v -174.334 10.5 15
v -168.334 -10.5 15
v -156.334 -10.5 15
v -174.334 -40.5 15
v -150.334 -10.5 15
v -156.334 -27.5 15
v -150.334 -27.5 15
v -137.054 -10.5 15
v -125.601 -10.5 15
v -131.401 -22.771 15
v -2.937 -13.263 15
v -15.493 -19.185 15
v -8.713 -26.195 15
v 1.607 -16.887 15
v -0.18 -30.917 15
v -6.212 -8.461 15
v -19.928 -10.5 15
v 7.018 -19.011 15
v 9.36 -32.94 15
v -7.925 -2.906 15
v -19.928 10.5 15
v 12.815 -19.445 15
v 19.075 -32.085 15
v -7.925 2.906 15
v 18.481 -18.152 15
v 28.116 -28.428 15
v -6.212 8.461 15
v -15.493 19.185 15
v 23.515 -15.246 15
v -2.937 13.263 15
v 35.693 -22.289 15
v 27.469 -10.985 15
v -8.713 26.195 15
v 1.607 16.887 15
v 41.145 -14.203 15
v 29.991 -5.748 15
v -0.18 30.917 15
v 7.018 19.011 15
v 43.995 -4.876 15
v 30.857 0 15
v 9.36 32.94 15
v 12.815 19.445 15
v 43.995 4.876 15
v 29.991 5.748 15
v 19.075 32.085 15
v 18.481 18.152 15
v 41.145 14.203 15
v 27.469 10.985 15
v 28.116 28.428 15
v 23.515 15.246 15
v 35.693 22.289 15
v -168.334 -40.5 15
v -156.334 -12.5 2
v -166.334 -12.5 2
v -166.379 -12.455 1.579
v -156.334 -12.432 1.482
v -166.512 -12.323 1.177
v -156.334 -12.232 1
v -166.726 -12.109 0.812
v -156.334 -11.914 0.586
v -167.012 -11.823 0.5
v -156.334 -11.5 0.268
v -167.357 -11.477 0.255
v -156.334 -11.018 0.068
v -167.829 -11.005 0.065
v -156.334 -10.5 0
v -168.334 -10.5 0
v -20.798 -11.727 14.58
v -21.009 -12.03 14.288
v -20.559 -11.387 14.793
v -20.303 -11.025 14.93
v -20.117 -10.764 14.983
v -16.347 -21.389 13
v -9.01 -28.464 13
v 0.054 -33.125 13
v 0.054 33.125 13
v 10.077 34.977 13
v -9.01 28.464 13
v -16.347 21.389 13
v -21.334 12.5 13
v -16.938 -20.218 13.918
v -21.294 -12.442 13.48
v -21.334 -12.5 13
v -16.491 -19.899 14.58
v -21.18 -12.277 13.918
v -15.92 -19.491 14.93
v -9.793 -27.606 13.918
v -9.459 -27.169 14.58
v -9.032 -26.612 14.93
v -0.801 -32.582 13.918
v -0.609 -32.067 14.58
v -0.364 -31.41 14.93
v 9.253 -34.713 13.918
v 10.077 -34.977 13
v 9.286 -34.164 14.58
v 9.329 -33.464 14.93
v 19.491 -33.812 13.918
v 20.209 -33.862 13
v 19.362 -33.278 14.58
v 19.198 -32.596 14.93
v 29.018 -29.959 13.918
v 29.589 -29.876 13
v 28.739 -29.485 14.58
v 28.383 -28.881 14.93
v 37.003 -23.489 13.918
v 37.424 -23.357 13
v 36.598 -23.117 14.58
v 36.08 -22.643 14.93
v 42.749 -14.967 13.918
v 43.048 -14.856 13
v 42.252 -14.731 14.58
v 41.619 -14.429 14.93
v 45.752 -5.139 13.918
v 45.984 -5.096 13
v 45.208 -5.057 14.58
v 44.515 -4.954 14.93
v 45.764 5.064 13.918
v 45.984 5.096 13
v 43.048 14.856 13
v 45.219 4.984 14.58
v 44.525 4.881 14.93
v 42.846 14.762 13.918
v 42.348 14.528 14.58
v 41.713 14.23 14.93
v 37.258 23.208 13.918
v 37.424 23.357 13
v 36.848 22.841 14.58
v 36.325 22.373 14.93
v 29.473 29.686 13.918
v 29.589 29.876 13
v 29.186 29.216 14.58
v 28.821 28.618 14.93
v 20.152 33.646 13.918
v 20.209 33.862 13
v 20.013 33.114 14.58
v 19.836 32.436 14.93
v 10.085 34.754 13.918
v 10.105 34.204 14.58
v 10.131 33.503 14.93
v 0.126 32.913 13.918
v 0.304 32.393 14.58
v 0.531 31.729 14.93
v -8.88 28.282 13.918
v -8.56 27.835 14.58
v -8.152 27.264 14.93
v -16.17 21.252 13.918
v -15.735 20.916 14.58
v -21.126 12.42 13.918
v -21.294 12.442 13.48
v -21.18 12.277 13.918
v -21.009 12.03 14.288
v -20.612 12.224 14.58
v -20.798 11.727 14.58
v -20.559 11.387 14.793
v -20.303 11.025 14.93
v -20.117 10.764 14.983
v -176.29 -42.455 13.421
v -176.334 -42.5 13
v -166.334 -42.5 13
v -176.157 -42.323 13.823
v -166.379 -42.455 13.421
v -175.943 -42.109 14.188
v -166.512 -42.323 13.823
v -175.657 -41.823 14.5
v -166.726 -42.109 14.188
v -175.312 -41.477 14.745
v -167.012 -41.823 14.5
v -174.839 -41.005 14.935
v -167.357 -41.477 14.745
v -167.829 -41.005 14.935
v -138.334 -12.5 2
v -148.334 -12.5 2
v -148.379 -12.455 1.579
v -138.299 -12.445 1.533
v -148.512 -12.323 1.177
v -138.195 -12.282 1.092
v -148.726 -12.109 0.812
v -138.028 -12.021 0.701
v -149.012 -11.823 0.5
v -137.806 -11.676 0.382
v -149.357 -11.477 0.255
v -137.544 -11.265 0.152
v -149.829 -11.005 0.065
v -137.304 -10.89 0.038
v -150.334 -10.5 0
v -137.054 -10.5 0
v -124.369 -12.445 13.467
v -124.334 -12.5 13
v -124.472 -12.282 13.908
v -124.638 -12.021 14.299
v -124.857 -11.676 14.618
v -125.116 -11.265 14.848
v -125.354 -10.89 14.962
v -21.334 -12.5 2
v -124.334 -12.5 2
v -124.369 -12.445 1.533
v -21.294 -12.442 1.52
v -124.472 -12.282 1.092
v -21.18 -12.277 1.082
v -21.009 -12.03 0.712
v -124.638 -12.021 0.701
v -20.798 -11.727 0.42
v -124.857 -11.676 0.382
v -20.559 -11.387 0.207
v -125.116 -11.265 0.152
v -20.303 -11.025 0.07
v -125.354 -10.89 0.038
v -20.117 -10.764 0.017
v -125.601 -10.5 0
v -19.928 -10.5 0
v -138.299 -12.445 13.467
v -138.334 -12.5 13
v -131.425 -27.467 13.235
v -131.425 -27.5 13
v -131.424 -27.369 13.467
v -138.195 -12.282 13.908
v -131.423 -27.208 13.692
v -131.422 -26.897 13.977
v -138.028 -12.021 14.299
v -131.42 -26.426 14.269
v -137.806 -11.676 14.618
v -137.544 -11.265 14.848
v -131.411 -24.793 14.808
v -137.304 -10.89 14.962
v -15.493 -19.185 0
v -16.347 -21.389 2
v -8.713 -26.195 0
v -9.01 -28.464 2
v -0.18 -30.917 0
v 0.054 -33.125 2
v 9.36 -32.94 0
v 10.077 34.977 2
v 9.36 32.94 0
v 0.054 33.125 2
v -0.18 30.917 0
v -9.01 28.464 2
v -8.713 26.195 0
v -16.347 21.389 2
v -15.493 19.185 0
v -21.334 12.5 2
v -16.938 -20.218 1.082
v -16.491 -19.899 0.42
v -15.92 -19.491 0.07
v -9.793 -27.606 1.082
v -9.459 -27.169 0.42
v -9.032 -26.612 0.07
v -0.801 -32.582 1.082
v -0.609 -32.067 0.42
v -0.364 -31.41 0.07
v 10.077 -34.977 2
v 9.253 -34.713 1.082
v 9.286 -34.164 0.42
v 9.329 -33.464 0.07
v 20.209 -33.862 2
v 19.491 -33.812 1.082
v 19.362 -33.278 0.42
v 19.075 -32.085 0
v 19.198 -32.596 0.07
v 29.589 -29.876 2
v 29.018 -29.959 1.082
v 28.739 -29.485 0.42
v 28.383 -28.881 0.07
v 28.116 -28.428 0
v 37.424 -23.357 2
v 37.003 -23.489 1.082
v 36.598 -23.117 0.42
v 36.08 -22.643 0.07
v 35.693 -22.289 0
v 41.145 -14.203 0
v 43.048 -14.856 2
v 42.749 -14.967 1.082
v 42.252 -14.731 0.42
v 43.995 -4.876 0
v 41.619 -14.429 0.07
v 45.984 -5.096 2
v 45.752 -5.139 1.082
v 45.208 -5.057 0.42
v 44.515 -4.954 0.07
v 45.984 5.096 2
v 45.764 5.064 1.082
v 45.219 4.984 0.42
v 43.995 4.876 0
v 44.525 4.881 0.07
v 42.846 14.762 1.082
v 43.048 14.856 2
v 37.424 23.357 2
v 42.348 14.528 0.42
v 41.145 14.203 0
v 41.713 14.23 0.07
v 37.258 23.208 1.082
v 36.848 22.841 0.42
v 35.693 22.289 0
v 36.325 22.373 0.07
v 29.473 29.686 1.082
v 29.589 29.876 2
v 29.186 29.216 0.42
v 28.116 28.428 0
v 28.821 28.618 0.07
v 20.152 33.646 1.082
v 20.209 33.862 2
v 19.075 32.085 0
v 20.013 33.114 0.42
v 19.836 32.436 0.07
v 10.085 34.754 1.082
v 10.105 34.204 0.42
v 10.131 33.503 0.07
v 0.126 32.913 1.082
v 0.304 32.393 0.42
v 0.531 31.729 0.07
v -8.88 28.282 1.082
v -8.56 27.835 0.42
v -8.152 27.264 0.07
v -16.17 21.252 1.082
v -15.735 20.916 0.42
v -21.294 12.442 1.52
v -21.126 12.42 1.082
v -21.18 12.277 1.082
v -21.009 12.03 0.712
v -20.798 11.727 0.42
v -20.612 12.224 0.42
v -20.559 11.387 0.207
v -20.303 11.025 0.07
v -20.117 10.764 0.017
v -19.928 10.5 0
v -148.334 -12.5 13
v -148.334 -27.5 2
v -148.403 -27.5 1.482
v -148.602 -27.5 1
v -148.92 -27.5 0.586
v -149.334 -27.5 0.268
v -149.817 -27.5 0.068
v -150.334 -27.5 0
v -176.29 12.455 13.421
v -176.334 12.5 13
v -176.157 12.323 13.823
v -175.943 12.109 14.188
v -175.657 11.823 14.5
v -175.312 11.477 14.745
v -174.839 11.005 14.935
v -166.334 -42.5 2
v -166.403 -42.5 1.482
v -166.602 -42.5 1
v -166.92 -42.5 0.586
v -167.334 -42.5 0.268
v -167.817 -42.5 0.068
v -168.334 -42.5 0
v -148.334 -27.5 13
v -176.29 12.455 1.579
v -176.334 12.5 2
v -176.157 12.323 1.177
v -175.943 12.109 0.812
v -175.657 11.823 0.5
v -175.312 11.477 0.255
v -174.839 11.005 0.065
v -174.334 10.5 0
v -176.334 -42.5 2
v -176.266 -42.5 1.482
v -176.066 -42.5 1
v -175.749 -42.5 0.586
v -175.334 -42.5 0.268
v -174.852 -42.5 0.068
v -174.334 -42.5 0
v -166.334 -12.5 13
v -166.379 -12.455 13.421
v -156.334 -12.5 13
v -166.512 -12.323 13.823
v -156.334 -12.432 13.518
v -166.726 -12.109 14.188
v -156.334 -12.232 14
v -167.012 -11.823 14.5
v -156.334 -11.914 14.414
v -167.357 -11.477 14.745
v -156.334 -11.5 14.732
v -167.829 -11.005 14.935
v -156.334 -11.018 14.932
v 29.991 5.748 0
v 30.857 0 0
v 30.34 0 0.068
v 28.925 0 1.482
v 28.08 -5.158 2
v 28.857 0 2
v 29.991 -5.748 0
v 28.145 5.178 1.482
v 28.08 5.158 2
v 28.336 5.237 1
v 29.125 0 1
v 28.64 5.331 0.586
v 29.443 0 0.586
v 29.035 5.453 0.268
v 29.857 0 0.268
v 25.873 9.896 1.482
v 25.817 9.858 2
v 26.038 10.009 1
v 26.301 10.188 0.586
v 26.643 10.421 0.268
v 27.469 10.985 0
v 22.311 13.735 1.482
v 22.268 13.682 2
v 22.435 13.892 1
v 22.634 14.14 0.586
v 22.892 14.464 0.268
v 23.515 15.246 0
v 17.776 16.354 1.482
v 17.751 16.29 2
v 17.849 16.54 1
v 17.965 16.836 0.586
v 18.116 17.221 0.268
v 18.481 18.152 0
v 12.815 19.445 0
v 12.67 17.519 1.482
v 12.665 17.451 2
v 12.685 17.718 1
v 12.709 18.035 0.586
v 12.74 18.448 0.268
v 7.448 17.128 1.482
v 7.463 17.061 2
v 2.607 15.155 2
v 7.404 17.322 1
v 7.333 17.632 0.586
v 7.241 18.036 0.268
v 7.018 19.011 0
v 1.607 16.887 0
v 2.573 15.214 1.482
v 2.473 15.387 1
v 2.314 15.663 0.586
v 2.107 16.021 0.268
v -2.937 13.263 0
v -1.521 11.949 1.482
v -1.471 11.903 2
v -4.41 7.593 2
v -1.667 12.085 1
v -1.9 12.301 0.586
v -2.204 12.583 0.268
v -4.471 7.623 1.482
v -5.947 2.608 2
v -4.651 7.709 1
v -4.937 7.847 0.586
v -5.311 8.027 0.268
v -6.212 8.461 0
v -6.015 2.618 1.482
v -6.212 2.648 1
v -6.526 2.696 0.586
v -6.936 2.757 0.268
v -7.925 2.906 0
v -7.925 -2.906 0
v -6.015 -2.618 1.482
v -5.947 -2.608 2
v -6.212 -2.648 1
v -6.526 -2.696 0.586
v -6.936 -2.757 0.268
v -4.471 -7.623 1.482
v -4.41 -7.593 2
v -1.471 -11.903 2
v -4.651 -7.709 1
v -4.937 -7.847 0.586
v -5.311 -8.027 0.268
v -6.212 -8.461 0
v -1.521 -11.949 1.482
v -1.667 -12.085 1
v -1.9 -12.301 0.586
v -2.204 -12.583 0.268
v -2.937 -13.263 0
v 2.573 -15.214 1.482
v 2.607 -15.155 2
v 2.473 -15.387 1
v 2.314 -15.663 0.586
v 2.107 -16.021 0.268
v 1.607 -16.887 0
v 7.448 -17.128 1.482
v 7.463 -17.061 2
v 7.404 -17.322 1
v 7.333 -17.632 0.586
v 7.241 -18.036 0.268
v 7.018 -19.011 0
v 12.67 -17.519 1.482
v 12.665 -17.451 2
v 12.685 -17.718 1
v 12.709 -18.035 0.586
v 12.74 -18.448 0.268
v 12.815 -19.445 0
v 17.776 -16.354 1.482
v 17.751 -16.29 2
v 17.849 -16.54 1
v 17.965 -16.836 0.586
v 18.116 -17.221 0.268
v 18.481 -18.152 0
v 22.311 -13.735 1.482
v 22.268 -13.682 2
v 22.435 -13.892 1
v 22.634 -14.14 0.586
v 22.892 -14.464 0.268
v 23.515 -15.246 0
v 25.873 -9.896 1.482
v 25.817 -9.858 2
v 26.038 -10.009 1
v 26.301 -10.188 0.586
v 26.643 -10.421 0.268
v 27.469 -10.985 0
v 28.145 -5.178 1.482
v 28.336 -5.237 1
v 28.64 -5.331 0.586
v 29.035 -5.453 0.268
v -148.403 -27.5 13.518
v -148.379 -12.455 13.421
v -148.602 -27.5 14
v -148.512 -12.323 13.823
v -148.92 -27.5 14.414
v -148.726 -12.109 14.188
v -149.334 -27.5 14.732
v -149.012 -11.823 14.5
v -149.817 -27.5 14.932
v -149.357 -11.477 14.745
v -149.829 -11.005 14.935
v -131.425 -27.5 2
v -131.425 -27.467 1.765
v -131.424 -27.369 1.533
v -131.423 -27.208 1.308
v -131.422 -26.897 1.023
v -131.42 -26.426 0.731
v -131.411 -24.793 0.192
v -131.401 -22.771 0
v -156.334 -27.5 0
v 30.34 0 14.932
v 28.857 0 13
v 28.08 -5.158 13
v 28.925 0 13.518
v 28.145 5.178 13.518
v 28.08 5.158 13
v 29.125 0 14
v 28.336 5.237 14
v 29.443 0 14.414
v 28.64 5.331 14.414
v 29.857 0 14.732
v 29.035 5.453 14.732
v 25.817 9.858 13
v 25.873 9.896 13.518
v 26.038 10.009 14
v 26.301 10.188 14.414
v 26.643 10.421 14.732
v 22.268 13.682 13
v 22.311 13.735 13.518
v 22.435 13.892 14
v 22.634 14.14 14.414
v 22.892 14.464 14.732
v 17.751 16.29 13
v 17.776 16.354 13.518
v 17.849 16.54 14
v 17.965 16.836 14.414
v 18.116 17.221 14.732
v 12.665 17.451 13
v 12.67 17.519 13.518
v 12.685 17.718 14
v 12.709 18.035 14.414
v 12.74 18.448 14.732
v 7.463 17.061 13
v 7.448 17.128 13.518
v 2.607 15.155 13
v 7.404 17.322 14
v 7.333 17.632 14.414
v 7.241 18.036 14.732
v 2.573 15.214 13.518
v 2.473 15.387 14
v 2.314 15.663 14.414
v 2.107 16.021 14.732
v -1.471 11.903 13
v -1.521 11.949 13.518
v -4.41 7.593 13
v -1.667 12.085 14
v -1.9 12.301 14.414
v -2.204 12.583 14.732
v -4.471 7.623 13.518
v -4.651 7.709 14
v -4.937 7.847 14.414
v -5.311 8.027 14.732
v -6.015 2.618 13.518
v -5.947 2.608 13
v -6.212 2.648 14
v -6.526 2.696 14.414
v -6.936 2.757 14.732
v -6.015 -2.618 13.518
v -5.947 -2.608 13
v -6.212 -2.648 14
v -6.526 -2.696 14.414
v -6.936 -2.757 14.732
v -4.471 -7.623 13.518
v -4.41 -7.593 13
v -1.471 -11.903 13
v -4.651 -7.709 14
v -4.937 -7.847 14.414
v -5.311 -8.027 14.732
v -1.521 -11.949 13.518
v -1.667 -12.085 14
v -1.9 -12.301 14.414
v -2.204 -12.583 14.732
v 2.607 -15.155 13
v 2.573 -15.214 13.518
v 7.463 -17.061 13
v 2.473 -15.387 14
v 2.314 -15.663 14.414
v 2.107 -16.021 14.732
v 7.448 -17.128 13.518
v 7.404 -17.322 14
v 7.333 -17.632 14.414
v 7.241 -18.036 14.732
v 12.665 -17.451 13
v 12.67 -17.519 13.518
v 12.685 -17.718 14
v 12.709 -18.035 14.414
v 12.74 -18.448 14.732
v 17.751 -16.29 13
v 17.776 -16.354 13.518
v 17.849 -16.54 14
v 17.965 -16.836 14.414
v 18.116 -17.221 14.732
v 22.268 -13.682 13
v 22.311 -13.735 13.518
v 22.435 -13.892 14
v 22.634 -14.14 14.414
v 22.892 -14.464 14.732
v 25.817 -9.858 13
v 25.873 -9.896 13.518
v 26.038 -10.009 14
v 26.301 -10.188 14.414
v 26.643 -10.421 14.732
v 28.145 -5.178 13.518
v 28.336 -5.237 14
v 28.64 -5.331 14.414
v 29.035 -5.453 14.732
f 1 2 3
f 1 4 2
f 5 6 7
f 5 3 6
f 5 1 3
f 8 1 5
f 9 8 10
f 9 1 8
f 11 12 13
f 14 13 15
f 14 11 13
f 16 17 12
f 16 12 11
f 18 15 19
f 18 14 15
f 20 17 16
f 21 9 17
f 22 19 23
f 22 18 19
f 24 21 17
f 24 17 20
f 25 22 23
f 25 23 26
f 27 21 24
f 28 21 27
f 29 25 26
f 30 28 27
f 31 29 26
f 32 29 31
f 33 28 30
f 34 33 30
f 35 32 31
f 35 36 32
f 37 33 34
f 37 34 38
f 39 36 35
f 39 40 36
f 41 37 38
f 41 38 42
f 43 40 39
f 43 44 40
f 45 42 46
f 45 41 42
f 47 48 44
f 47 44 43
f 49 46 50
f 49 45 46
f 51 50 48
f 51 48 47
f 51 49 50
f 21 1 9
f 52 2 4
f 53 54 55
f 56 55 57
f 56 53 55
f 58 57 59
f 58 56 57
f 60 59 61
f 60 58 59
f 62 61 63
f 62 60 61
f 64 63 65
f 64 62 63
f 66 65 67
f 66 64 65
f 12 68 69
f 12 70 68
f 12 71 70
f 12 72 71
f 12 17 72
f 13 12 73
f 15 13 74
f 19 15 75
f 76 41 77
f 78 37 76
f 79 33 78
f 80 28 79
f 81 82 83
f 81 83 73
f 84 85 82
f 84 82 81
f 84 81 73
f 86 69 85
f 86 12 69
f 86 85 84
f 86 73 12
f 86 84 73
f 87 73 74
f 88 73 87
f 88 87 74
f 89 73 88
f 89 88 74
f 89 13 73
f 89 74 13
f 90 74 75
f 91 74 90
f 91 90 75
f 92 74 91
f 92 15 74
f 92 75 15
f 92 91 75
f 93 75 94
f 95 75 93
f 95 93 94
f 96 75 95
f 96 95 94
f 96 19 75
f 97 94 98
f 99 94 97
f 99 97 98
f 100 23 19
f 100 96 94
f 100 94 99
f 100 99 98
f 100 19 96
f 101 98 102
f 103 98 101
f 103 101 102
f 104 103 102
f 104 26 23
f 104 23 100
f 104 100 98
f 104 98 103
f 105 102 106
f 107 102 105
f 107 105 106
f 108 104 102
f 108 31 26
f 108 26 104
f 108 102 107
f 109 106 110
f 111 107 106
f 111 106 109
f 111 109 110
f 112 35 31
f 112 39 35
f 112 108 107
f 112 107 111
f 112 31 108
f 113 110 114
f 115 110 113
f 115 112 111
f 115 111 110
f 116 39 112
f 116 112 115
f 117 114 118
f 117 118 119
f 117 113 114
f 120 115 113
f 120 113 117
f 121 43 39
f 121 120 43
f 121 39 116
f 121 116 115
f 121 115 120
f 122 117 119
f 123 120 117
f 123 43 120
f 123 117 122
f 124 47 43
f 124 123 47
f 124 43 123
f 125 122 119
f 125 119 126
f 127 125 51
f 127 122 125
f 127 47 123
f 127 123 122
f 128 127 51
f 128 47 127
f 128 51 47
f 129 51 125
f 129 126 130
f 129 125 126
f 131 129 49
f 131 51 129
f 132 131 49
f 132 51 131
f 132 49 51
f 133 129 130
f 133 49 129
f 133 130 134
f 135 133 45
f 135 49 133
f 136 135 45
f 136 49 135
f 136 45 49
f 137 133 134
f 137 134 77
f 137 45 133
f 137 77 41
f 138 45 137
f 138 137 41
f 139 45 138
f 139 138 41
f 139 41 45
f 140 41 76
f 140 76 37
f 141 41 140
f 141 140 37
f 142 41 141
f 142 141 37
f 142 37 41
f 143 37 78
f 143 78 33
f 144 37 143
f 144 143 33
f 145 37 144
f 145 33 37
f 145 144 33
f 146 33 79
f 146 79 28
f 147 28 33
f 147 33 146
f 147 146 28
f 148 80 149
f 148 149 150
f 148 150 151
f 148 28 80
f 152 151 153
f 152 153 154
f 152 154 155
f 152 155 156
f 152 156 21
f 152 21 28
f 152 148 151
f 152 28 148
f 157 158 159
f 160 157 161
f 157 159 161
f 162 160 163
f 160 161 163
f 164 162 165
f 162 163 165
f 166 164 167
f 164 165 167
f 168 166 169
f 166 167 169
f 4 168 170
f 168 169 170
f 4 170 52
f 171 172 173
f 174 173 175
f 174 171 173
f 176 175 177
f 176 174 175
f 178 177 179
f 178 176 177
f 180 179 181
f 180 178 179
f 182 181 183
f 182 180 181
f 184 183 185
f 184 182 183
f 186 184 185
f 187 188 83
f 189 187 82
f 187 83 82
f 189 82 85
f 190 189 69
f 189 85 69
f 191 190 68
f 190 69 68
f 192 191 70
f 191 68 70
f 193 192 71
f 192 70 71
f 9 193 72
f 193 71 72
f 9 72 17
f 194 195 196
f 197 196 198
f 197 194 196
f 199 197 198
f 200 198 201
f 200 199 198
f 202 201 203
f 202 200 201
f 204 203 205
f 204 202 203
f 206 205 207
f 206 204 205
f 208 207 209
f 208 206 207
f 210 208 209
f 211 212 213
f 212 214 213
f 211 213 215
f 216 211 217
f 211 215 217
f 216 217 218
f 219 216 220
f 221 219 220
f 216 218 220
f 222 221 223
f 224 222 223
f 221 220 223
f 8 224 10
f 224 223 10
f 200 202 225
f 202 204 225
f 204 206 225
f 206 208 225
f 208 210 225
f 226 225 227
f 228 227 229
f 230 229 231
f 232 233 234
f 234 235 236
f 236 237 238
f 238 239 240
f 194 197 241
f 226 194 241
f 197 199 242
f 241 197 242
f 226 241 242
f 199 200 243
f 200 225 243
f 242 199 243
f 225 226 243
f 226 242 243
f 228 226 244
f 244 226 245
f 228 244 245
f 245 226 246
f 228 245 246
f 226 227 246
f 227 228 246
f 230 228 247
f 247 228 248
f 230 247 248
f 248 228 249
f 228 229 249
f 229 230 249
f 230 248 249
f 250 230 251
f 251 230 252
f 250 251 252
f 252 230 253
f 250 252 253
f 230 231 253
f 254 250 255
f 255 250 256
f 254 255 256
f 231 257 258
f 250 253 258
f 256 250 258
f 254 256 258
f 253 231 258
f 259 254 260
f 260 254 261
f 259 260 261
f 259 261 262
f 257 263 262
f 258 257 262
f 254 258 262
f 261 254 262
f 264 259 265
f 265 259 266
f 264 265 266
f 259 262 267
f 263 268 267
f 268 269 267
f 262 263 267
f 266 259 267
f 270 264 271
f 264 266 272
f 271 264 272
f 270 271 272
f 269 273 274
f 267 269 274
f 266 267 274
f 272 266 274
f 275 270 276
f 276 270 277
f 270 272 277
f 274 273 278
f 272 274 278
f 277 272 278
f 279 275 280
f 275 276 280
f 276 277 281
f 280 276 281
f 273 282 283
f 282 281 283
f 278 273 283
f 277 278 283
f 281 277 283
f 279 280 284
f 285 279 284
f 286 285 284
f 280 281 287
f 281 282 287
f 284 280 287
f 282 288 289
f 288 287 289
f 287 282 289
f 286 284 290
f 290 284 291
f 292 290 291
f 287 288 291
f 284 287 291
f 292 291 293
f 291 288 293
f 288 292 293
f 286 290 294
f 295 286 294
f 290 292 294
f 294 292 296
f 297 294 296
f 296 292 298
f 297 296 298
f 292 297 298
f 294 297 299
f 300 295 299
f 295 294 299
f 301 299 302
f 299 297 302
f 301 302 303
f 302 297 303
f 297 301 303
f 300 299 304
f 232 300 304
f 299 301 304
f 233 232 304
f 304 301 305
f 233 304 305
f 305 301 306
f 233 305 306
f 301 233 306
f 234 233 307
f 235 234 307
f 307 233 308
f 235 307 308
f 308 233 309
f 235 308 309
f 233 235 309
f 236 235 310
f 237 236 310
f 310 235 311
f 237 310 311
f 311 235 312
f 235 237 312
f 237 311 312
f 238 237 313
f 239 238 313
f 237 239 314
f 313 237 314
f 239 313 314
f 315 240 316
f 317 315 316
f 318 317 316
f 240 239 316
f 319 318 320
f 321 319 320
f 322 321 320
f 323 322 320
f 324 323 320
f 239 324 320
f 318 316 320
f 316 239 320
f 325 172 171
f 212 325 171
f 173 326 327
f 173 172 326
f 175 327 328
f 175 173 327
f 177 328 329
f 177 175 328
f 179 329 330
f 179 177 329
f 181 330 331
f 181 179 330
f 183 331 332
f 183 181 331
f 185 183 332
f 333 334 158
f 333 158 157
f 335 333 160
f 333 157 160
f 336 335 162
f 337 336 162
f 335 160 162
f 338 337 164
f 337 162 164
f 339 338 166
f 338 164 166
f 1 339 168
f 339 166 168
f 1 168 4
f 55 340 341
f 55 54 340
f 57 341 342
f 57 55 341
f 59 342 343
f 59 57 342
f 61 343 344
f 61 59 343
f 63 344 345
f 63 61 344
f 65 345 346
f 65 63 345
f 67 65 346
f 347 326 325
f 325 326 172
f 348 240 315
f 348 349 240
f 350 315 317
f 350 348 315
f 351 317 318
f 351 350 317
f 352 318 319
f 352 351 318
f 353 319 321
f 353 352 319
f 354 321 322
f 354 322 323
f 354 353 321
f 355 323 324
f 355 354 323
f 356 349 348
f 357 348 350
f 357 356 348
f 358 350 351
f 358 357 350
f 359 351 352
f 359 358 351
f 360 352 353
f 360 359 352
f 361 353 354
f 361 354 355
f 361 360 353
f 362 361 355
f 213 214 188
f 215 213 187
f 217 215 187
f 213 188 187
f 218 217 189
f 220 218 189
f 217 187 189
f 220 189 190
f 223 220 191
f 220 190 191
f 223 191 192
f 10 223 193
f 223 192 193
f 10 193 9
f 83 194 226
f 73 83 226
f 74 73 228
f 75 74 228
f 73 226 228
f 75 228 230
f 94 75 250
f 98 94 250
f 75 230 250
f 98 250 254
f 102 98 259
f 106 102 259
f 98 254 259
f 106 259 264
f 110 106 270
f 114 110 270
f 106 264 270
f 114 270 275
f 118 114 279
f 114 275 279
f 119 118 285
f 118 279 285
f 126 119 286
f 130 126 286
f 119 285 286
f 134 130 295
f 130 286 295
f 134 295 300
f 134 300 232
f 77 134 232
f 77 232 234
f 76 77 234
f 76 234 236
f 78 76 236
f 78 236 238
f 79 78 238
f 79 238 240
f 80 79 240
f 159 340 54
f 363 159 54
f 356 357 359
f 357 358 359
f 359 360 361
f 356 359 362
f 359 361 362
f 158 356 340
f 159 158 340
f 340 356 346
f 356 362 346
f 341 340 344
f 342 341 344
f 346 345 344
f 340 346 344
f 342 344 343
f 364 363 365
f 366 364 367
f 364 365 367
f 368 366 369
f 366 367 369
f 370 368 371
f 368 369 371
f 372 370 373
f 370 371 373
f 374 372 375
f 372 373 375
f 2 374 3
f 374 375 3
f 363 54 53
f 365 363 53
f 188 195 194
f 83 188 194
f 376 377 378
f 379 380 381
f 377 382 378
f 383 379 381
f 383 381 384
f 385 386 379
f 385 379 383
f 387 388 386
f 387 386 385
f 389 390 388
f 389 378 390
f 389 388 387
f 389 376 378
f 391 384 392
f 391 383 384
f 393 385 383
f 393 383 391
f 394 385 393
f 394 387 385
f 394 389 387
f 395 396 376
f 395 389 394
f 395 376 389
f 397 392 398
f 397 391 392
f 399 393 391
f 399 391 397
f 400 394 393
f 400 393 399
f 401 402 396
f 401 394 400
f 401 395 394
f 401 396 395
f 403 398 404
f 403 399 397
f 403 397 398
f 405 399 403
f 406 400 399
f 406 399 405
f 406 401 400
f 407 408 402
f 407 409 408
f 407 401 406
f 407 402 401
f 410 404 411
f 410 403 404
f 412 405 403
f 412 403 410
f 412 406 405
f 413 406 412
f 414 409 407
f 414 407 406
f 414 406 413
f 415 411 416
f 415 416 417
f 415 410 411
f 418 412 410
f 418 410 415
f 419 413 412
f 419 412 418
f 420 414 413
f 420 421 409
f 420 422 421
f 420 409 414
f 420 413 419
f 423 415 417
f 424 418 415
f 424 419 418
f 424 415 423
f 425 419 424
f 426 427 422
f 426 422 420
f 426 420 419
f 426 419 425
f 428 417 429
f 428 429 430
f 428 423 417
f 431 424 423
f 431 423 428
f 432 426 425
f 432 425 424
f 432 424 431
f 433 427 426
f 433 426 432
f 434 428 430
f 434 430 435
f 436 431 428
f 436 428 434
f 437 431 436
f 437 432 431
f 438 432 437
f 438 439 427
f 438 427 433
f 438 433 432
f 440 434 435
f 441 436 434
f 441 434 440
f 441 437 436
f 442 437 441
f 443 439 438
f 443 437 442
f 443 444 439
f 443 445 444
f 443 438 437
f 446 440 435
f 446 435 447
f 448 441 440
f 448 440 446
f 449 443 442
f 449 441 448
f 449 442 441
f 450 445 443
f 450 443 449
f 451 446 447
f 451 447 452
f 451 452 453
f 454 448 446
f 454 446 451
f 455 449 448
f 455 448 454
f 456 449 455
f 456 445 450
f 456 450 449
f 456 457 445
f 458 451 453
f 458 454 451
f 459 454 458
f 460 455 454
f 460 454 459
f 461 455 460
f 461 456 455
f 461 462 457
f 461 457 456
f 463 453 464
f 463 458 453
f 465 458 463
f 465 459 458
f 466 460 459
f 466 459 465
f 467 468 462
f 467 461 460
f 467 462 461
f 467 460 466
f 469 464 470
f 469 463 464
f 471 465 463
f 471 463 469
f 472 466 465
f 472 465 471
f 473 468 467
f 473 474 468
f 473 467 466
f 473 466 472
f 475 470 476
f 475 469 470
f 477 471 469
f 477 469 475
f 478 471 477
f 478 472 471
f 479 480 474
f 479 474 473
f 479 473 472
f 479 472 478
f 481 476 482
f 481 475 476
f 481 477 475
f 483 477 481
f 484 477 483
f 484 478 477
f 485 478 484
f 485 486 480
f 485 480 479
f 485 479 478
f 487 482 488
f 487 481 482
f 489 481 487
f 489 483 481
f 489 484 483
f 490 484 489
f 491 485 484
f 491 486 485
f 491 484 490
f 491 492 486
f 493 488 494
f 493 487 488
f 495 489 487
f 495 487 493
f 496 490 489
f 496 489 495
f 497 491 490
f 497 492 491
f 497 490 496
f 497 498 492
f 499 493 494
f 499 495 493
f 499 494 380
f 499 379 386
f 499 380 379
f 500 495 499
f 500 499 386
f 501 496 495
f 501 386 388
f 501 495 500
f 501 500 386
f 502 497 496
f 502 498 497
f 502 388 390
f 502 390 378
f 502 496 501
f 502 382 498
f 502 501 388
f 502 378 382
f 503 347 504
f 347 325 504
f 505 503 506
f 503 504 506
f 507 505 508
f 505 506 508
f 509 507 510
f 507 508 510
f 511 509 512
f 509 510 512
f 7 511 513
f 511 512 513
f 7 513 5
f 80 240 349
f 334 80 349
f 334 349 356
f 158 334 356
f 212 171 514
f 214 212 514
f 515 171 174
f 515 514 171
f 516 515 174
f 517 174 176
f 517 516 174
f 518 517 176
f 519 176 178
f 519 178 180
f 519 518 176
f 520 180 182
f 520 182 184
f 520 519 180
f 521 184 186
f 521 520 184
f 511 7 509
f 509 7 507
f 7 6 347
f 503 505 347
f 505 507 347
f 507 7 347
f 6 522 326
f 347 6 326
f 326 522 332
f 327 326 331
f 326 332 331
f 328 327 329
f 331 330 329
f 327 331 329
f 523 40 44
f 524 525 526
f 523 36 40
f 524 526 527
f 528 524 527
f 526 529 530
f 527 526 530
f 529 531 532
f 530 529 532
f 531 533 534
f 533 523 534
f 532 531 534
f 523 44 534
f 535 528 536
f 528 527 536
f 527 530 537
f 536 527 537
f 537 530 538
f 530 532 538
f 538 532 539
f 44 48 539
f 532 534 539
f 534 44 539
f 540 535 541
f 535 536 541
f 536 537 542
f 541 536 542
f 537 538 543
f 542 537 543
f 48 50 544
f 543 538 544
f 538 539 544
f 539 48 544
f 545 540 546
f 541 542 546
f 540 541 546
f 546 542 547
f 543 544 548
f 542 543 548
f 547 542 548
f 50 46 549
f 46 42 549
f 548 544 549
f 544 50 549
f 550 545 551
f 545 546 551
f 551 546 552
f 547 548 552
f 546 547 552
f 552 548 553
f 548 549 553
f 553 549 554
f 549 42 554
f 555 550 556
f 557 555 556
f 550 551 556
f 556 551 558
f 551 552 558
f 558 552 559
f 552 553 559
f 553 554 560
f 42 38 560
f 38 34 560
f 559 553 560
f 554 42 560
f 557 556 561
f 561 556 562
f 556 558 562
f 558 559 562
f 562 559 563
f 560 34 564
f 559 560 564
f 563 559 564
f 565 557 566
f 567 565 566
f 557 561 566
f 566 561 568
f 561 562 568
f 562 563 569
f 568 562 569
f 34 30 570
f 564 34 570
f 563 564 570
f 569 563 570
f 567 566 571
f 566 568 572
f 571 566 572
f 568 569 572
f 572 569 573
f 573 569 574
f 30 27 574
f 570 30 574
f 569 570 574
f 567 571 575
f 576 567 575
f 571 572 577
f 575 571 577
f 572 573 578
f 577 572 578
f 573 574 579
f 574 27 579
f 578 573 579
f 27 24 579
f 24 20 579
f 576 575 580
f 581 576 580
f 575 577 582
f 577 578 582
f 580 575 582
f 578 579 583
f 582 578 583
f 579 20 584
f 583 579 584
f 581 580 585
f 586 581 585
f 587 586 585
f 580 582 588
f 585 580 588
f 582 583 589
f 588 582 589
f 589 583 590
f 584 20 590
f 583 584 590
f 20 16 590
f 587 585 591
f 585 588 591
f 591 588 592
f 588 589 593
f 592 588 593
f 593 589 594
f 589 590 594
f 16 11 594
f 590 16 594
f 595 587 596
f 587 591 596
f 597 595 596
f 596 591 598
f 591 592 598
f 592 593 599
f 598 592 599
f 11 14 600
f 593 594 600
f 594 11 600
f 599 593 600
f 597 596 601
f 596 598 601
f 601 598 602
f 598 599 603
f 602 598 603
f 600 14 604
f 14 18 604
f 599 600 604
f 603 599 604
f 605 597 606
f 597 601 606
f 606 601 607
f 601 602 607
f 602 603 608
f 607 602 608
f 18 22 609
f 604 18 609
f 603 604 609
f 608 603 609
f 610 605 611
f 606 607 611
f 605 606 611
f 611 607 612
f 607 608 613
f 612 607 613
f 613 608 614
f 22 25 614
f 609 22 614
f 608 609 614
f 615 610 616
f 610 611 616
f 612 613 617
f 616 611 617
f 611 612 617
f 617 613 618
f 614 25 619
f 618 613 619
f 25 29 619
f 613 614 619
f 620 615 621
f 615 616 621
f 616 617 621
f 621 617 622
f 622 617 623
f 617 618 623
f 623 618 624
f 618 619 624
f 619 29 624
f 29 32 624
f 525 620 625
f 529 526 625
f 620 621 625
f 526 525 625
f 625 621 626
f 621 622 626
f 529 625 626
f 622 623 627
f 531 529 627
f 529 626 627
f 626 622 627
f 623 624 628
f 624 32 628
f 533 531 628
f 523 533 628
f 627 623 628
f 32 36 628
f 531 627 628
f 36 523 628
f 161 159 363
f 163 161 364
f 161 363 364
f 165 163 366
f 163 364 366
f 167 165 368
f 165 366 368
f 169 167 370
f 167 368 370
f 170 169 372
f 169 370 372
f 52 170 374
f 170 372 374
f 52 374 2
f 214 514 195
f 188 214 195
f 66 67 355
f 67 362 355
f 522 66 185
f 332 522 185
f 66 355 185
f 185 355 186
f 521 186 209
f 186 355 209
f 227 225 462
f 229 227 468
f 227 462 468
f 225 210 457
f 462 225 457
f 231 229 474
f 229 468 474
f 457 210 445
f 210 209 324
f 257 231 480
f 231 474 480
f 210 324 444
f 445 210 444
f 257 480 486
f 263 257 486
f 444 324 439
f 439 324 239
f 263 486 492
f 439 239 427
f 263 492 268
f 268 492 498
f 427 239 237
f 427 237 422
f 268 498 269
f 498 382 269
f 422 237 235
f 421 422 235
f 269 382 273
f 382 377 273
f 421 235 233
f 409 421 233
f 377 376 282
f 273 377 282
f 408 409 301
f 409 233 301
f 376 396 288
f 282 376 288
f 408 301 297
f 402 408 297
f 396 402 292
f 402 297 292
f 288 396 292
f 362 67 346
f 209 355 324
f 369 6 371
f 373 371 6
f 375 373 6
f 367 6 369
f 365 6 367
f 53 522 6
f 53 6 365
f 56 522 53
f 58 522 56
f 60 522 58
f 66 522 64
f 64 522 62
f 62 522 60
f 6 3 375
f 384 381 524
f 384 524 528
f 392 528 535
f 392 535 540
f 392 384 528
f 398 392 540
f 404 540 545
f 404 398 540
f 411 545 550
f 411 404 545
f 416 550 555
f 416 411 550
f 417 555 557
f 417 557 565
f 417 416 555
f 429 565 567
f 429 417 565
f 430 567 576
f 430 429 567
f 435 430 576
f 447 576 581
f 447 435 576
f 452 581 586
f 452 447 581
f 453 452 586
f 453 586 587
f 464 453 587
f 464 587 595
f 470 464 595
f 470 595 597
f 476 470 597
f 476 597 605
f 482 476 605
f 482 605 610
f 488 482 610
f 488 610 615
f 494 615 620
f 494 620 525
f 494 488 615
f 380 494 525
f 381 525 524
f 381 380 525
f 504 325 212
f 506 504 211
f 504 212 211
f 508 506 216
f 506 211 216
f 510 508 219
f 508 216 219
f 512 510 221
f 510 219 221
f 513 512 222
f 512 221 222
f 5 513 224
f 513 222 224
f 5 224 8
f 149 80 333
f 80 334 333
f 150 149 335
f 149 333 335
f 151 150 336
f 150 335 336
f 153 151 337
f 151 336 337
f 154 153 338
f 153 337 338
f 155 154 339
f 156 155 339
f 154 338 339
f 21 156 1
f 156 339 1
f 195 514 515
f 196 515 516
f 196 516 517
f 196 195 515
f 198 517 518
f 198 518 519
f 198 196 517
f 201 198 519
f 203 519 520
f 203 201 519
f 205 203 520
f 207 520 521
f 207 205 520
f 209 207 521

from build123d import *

# Parameters (mm, degrees)
F0_W     = 8
F0_H     = 15
F0_W_2   = 10
F0_H_2   = 30
F0_R     = 17.5
F1_DEPTH = 15
F2_R     = 2


with BuildPart() as f1:
    # F0 (on Top) → F1 (new body)
    with BuildSketch(Plane.XY):
        Polygon((-21.3343975244, -12.5), (-21.3343975244, 12.5), (-176.3343975244, 12.5), (-176.3343975244, -12.5), (-166.3343975244, -12.5), (-156.3343975244, -12.5), (-148.3343975244, -12.5), (-138.3343975244, -12.5), (-124.3343975244, -12.5), align=None)
        with Locations((-152.3343975244, -20)):
            Rectangle(F0_W, F0_H)
        with Locations((-171.3343975244, -27.5)):
            Rectangle(F0_W_2, F0_H_2)
        Polygon((-131.424844265, -27.5), (-124.3343975244, -12.5), (-138.3343975244, -12.5), align=None)
        with BuildLine():
            ThreePointArc((-21.3343975244, -12.5), (46.3573445521, 0), (-21.3343975244, 12.5))
            Line((-21.3343975244, 12.5), (-21.3343975244, -12.5))
        make_face()
        with Locations((11.3573445521, 0)):
            Circle(F0_R, mode=Mode.SUBTRACT)
    extrude(amount=F1_DEPTH)

    # F2
    f2_edges = [f1.edges().sort_by_distance(p)[0] for p in [
        (-98.834398, 12.5, 15),
        (-72.834398, -12.5, 15),
        (-127.879621, -20, 15),
        (-134.879621, -20, 15),
        (-148.334398, -20, 15),
        (-143.334398, -12.5, 15),
        (-161.334398, -12.5, 15),
        (-166.334398, -27.5, 15),
        (-171.334398, -42.5, 15),
        (-176.334398, -15, 15),
        (46.357345, 0, 15),
        (-6.142655, 0, 15),
        (-98.834398, 12.5, 0),
        (-72.834398, -12.5, 0),
        (-127.879621, -20, 0),
        (-143.334398, -12.5, 0),
        (-134.879621, -20, 0),
        (-148.334398, -20, 0),
        (46.357345, 0, 0),
        (-6.142655, 0, 0),
        (-176.334398, -15, 0),
        (-166.334398, -27.5, 0),
        (-161.334398, -12.5, 0),
    ]]
    fillet(f2_edges, radius=F2_R)


solid = f1.part
